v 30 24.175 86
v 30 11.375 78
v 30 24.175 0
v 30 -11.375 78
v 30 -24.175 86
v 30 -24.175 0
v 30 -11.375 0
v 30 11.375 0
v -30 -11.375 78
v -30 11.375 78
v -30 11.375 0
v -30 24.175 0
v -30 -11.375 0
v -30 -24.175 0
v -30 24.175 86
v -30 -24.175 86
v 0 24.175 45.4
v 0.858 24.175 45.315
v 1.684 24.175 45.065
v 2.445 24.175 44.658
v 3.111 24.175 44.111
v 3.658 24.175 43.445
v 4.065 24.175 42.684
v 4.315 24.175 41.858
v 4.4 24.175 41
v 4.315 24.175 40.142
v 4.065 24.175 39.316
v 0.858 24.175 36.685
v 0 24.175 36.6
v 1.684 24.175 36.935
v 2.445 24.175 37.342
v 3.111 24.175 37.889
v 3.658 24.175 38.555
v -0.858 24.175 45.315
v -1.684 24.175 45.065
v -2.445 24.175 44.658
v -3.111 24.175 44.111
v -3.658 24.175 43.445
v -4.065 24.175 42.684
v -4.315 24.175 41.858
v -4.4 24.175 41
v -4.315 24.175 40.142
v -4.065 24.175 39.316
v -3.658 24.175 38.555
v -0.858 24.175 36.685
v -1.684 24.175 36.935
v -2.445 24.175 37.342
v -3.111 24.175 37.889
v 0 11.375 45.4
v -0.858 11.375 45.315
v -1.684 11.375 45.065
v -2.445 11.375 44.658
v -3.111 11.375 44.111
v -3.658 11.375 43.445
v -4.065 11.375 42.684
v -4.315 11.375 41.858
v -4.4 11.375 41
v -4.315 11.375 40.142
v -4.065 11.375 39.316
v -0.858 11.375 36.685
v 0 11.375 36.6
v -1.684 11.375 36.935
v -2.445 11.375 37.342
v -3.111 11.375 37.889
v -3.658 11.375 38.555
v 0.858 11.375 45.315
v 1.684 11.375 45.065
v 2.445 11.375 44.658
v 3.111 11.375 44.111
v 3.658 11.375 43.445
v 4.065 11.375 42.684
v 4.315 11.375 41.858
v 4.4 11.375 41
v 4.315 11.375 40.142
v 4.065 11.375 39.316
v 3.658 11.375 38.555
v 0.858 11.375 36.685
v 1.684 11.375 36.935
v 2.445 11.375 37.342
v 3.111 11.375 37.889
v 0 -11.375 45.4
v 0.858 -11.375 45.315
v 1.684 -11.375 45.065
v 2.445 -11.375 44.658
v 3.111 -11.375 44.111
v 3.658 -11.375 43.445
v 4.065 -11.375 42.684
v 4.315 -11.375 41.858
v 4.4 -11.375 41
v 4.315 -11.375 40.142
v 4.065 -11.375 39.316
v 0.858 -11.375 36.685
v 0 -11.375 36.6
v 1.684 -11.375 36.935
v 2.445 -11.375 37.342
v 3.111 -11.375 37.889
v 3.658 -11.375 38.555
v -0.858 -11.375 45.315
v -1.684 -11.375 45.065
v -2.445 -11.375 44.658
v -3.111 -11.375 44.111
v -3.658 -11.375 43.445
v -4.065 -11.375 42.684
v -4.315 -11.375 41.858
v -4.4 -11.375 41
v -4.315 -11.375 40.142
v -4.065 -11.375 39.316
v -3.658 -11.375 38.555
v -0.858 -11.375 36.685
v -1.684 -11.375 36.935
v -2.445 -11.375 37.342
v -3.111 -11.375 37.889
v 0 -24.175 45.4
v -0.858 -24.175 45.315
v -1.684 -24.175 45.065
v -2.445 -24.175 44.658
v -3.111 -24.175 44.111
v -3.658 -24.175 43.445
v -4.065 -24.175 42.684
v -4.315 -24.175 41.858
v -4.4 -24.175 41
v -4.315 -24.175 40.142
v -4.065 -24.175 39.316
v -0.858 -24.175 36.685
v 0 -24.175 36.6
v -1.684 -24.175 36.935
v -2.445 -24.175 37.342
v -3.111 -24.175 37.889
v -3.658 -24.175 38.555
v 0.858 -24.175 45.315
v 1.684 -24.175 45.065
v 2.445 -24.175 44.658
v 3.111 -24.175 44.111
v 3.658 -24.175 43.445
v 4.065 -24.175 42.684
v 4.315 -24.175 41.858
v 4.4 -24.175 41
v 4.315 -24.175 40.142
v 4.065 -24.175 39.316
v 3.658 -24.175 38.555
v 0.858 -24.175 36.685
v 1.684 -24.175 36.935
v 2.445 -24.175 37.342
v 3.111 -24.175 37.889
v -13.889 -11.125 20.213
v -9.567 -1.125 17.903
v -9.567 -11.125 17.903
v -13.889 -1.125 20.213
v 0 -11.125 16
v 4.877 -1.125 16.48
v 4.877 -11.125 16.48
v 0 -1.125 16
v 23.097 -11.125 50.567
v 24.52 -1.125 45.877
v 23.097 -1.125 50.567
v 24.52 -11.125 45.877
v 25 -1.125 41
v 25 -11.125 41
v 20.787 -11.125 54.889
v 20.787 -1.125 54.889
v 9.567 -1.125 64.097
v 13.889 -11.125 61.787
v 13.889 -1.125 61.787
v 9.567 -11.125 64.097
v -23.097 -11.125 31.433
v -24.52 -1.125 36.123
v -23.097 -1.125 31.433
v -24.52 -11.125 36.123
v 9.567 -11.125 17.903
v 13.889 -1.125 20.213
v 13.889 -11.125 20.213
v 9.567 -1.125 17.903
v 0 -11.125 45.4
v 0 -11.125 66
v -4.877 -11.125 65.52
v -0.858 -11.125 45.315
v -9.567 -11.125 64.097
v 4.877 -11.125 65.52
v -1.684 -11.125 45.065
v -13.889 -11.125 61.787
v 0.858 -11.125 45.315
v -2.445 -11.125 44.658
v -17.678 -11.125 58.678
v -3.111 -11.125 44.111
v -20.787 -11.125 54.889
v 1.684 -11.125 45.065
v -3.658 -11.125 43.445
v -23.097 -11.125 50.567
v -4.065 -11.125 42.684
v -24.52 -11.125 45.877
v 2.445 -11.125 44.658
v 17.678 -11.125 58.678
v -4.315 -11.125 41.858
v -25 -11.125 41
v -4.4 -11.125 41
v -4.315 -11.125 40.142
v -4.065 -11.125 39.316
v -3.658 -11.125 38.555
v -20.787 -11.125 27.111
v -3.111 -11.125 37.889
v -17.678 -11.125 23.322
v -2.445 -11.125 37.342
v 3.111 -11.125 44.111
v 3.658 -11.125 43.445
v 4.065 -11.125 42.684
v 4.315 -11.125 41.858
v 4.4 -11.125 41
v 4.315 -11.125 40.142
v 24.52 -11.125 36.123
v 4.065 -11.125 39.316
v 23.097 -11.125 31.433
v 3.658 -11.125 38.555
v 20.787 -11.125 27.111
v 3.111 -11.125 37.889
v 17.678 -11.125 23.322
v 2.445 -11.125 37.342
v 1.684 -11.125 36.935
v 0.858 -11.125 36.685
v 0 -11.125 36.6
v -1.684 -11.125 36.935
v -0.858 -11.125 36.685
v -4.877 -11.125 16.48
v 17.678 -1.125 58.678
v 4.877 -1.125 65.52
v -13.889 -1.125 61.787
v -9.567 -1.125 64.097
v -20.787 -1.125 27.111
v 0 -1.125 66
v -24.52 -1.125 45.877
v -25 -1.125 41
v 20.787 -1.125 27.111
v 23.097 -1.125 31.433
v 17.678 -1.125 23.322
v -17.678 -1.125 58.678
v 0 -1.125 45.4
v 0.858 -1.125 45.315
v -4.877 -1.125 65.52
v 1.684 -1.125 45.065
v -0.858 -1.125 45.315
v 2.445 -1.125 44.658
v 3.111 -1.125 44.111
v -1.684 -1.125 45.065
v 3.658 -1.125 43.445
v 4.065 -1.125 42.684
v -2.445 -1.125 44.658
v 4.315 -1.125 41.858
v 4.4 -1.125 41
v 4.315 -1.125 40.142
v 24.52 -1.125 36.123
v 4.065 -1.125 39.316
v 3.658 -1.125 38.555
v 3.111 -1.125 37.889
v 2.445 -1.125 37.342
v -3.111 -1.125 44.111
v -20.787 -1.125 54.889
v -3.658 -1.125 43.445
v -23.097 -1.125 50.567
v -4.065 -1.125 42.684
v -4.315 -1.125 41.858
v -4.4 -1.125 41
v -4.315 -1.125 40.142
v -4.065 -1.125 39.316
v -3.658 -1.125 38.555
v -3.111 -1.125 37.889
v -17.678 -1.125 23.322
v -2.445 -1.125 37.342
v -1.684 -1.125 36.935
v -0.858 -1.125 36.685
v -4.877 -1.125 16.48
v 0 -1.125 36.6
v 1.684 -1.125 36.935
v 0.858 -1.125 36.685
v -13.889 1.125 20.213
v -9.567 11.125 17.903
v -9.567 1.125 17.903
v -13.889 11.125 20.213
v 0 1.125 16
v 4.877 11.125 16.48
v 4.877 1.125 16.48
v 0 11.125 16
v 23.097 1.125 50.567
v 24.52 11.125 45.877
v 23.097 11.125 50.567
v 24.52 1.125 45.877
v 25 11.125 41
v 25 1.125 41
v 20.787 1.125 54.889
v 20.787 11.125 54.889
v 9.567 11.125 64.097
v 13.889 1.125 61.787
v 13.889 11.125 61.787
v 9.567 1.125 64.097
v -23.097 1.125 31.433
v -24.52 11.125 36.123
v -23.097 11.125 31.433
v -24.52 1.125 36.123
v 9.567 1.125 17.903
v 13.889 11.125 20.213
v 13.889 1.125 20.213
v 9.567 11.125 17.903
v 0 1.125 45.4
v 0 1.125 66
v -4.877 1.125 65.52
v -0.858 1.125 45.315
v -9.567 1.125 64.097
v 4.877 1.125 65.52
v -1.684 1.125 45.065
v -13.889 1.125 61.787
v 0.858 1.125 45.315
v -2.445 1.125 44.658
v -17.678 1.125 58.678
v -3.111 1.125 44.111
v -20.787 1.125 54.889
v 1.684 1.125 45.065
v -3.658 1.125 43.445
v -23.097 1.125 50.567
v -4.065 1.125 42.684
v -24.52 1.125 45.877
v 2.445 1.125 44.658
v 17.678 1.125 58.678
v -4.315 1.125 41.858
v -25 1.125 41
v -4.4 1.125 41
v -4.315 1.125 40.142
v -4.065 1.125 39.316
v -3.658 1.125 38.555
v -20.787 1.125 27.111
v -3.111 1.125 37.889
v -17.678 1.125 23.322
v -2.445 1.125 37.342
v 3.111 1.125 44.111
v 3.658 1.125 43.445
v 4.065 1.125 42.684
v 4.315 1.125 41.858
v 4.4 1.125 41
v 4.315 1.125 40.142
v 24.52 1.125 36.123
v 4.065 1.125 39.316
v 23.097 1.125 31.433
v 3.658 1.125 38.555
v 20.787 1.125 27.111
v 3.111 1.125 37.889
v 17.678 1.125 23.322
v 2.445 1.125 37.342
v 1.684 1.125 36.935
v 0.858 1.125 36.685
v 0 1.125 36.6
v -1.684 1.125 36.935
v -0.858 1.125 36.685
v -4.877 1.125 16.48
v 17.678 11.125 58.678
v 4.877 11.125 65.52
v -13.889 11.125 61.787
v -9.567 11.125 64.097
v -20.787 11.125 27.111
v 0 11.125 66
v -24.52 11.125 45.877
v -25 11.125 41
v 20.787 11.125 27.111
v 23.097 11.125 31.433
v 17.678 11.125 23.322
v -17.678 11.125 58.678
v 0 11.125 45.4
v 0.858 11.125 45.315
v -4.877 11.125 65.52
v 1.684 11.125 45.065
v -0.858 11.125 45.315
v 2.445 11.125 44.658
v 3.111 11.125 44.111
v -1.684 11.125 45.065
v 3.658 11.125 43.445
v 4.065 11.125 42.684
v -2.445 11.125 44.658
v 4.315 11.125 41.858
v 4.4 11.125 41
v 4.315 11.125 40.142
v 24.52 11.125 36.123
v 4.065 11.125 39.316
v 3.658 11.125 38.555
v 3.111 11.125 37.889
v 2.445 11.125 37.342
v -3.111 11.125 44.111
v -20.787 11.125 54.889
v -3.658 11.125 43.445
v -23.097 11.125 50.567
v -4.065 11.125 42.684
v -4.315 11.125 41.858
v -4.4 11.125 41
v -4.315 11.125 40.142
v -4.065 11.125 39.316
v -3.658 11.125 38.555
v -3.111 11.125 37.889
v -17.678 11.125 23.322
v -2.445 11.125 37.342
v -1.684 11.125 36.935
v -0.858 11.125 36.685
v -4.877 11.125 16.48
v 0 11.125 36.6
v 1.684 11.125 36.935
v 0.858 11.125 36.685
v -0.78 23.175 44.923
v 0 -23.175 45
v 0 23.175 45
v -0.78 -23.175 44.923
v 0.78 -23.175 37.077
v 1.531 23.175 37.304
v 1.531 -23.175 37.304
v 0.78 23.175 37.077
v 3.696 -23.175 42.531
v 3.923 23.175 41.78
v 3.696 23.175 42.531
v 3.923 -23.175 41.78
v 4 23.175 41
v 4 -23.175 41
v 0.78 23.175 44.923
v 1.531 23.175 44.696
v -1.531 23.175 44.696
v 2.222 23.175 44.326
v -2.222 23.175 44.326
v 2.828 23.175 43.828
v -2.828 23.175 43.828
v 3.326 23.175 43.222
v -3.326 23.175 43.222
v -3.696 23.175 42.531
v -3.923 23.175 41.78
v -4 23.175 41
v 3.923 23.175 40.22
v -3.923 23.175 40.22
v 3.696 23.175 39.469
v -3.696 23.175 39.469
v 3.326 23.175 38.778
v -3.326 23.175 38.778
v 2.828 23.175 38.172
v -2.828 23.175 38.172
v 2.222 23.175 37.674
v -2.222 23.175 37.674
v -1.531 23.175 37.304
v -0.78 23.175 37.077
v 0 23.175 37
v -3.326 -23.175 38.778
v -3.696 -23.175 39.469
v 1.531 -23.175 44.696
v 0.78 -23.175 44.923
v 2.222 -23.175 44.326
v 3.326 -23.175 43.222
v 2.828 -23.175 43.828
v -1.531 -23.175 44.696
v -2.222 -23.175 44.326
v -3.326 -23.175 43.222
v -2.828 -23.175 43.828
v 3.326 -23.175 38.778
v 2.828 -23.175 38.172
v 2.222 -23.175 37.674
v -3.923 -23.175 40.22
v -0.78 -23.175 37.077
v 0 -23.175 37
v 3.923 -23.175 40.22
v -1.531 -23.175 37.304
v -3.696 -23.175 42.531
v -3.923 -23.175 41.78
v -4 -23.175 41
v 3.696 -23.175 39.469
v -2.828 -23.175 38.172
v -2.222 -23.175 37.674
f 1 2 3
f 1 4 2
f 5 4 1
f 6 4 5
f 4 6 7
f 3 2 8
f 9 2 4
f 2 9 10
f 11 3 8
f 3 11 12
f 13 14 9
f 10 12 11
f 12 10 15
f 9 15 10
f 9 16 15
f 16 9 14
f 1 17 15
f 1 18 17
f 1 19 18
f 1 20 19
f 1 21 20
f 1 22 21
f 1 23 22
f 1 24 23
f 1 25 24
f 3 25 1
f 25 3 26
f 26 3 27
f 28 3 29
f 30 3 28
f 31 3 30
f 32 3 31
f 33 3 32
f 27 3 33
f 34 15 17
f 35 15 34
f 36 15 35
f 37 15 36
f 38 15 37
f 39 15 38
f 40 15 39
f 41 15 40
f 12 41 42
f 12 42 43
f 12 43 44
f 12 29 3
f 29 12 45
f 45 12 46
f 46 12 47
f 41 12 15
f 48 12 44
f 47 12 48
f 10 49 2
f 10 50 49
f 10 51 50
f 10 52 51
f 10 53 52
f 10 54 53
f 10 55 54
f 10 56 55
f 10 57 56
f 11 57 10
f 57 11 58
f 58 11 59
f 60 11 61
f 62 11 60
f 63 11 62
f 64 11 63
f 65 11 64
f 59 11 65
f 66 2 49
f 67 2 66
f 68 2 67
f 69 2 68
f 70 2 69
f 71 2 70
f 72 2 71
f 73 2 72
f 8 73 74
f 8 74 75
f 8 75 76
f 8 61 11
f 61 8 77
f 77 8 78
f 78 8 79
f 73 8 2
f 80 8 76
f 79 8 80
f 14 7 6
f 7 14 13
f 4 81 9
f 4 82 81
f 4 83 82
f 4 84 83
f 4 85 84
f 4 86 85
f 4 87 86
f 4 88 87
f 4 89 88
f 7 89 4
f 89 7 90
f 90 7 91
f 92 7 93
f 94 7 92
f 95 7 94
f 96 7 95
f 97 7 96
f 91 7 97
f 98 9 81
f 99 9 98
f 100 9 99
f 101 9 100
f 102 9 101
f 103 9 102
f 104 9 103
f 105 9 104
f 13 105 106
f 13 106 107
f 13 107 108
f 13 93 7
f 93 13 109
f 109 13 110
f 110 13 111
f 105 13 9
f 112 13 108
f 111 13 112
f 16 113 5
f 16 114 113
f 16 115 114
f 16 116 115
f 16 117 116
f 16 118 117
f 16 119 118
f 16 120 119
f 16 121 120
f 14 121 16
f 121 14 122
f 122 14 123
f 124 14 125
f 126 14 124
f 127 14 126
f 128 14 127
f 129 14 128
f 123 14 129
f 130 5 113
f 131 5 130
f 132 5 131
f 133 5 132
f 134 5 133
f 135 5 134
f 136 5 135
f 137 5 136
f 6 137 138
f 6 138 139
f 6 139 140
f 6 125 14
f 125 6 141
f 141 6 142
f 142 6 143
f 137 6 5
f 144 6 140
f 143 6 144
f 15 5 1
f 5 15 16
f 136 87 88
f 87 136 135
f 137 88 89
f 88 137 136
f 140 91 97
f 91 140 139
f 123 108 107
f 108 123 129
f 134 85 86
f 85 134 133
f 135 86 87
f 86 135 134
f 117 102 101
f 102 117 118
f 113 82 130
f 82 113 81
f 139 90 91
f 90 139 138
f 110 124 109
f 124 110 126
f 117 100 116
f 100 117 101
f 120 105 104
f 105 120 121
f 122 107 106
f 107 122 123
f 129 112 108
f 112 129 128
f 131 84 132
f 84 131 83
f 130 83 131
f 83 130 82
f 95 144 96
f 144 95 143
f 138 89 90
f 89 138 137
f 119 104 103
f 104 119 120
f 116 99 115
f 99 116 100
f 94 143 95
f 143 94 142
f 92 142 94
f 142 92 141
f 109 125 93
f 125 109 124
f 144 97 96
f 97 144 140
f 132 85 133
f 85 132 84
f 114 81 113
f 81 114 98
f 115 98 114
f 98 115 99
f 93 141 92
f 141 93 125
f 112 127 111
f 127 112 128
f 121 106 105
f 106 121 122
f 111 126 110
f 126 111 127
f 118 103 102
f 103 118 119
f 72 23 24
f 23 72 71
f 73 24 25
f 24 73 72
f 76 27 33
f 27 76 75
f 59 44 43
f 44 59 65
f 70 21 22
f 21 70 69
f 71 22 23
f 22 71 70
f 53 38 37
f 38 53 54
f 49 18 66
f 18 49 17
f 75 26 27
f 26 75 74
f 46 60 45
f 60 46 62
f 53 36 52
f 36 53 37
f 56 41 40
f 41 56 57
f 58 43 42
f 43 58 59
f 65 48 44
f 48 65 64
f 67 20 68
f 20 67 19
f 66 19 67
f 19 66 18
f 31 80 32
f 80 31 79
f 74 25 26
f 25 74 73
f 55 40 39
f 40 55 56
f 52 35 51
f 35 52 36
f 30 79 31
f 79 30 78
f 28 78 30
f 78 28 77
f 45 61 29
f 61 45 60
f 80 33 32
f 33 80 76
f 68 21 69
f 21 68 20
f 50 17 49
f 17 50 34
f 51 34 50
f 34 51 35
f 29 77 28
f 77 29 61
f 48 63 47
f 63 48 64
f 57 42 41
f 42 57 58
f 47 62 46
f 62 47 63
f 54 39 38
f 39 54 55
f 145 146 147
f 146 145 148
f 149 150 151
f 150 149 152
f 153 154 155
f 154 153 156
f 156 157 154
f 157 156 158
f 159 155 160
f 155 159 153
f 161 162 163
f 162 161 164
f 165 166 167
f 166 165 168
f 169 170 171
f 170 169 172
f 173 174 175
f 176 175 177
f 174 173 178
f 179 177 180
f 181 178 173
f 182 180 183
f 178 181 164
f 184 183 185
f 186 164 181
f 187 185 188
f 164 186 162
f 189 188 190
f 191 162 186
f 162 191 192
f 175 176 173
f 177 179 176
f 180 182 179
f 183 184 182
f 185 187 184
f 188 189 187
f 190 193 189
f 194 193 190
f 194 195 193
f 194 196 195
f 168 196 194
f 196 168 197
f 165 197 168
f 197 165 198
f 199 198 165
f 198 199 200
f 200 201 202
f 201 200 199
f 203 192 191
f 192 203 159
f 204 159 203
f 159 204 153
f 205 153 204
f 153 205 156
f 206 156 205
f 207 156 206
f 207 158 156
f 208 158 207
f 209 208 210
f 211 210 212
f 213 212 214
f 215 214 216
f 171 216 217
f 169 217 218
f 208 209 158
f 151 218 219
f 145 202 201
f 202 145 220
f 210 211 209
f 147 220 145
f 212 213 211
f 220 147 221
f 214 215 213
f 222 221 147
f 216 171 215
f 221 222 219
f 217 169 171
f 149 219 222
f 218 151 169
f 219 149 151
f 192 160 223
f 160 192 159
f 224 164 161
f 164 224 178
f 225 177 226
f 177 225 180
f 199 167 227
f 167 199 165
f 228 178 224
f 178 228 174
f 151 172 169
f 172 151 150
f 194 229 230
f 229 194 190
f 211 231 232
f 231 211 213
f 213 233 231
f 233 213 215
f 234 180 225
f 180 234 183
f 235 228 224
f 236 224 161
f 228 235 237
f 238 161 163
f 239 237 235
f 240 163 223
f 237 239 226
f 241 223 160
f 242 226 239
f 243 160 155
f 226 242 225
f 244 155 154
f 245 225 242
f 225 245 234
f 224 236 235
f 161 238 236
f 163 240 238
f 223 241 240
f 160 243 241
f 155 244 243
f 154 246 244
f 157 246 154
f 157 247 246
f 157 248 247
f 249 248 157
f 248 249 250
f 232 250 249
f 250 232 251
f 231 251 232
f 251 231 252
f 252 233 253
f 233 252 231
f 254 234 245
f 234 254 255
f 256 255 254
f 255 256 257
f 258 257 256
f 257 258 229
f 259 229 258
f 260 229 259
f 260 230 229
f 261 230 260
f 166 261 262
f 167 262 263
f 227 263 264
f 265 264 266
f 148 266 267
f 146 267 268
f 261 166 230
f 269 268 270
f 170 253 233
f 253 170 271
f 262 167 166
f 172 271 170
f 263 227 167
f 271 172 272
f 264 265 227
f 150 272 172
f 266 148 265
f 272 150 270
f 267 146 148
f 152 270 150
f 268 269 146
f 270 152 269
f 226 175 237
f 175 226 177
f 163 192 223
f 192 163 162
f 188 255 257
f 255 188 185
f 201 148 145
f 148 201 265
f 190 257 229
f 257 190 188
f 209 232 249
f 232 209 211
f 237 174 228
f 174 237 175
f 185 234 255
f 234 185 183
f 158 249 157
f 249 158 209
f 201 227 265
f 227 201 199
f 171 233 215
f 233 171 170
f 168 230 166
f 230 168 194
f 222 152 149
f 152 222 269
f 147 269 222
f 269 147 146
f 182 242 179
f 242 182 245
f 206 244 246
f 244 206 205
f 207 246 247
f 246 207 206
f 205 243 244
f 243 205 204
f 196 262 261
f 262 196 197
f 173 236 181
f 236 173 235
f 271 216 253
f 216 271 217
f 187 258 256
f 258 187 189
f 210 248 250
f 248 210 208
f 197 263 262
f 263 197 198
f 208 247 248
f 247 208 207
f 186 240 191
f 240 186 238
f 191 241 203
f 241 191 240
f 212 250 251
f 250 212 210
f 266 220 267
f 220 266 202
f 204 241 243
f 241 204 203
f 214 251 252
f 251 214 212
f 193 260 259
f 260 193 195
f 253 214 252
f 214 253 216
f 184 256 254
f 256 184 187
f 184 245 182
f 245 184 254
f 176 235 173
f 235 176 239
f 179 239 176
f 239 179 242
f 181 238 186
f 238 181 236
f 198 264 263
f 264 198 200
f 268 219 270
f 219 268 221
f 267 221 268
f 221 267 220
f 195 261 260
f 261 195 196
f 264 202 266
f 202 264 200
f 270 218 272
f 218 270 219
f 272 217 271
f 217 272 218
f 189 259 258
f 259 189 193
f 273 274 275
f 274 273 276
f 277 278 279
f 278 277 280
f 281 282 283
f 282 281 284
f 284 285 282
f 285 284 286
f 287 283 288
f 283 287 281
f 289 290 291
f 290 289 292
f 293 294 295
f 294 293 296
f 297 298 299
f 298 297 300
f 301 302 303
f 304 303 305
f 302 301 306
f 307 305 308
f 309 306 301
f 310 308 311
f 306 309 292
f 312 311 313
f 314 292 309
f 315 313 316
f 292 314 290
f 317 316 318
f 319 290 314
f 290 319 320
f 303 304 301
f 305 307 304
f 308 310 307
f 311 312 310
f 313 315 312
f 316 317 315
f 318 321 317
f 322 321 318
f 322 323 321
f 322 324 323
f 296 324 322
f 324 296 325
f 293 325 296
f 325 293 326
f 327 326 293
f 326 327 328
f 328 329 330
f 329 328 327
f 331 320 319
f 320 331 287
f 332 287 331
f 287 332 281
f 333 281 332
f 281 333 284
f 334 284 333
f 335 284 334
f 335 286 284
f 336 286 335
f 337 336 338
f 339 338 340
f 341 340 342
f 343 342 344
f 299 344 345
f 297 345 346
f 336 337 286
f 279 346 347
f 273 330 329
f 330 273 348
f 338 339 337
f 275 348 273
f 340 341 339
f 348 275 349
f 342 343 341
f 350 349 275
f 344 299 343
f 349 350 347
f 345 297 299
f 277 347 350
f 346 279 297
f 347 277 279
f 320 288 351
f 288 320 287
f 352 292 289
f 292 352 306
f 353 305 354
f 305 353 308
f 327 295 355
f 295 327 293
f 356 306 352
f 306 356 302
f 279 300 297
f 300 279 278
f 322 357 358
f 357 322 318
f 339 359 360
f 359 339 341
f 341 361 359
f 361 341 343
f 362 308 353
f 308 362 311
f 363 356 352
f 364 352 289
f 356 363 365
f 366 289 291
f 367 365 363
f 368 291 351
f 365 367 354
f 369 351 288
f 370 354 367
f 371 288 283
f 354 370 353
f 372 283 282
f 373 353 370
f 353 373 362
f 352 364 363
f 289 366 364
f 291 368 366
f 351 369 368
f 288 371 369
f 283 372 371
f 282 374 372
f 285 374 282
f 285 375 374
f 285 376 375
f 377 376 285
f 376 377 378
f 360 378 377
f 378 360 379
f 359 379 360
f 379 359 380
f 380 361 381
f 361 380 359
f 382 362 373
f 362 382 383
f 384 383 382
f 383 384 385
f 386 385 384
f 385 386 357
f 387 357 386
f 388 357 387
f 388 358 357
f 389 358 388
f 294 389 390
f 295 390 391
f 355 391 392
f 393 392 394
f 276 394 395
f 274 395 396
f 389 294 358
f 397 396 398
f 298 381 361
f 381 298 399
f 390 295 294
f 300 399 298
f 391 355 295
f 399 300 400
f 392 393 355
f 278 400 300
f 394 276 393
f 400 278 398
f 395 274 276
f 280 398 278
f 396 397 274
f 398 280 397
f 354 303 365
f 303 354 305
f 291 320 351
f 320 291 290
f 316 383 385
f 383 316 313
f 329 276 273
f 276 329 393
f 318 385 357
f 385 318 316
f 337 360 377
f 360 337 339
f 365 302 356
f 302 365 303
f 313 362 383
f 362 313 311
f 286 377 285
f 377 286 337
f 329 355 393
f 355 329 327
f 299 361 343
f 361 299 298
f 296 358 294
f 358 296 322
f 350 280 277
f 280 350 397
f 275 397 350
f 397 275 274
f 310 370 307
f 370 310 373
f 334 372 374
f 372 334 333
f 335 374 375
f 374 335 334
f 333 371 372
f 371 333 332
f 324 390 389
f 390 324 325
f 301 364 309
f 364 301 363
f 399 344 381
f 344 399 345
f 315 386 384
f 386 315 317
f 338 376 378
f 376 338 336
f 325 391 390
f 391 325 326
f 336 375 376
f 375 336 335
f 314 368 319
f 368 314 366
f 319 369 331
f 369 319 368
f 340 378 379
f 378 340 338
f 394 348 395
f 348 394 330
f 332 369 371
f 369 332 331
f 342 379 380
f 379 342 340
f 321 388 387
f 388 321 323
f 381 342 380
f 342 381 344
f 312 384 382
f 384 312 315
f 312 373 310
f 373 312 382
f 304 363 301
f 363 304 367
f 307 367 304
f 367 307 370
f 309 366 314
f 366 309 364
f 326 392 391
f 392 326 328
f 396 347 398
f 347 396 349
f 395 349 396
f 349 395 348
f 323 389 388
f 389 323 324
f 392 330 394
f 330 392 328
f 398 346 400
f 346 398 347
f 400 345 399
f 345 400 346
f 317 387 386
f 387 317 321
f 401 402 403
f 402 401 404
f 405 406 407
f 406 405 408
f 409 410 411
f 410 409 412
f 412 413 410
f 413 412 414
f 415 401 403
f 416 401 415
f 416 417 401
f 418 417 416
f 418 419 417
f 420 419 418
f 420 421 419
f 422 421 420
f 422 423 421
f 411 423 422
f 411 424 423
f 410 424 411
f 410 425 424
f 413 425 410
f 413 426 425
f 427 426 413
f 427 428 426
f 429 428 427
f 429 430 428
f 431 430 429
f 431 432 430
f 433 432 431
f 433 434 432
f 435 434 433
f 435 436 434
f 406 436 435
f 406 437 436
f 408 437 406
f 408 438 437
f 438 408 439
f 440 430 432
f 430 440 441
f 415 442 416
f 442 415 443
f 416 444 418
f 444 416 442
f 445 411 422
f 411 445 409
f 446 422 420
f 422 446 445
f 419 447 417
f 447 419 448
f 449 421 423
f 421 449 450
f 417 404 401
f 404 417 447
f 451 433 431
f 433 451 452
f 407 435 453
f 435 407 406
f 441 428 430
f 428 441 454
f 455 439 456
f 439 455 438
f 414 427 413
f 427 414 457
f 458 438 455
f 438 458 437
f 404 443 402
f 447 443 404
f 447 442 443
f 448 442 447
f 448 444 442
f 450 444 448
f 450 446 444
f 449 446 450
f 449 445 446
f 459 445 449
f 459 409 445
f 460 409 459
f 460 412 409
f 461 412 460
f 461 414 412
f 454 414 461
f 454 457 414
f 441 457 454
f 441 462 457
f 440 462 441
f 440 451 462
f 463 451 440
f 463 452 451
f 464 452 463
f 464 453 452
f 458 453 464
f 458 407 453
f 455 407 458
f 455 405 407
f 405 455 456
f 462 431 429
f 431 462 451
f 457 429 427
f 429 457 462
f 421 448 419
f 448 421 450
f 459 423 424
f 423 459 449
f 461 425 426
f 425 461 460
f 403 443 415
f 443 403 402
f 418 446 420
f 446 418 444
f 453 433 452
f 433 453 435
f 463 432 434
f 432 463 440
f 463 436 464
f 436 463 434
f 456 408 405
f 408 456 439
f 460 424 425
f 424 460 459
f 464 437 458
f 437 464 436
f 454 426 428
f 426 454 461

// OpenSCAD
$fn = 32;

// ------------------------------------------------------------------------
// Trolley wheel set: wheels d50, fork 78 mm tall
// Every part is its own module, assembly() places every instance.
// ------------------------------------------------------------------------

// --- part 1 ---
module trolley_fork() {
  difference() {
    union() {
      translate([-30, 11.375, 0]) cube([60, 12.8, 78]);
      translate([-30, -24.175, 0]) cube([60, 12.8, 78]);
      translate([-30, -24.175, 78]) cube([60, 48.35, 8]);
    }
    translate([0, -17.775, 41]) rotate([90, 0, 0]) cylinder(h = 14.8, d = 8.8, center = true);
    translate([0, 17.775, 41]) rotate([90, 0, 0]) cylinder(h = 14.8, d = 8.8, center = true);
  }
}

// --- part 2 ---
module trolley_wheel() {
  difference() {
      translate([0, 0, 0]) cylinder(h = 10, d = 50);
      translate([0, 0, -1]) cylinder(h = 12, d = 8.8);
    }
}

// --- part 3 ---
module trolley_axle() {
  translate([0, 0, -23.175]) cylinder(h = 46.35, d = 8);
}

// --- assembly ---
module assembly() {
  color([0.80, 0.24, 0.20]) translate([0, 0, 0]) rotate([0, 0, 0]) trolley_fork();
  color([0.20, 0.45, 0.75]) translate([0, -1.125, 41]) rotate([90, 0, 0]) trolley_wheel();
  color([0.25, 0.62, 0.32]) translate([0, 11.125, 41]) rotate([90, 0, 0]) trolley_wheel();
  color([0.92, 0.70, 0.18]) translate([0, 0, 41]) rotate([90, 0, 0]) trolley_axle();
}

assembly();
